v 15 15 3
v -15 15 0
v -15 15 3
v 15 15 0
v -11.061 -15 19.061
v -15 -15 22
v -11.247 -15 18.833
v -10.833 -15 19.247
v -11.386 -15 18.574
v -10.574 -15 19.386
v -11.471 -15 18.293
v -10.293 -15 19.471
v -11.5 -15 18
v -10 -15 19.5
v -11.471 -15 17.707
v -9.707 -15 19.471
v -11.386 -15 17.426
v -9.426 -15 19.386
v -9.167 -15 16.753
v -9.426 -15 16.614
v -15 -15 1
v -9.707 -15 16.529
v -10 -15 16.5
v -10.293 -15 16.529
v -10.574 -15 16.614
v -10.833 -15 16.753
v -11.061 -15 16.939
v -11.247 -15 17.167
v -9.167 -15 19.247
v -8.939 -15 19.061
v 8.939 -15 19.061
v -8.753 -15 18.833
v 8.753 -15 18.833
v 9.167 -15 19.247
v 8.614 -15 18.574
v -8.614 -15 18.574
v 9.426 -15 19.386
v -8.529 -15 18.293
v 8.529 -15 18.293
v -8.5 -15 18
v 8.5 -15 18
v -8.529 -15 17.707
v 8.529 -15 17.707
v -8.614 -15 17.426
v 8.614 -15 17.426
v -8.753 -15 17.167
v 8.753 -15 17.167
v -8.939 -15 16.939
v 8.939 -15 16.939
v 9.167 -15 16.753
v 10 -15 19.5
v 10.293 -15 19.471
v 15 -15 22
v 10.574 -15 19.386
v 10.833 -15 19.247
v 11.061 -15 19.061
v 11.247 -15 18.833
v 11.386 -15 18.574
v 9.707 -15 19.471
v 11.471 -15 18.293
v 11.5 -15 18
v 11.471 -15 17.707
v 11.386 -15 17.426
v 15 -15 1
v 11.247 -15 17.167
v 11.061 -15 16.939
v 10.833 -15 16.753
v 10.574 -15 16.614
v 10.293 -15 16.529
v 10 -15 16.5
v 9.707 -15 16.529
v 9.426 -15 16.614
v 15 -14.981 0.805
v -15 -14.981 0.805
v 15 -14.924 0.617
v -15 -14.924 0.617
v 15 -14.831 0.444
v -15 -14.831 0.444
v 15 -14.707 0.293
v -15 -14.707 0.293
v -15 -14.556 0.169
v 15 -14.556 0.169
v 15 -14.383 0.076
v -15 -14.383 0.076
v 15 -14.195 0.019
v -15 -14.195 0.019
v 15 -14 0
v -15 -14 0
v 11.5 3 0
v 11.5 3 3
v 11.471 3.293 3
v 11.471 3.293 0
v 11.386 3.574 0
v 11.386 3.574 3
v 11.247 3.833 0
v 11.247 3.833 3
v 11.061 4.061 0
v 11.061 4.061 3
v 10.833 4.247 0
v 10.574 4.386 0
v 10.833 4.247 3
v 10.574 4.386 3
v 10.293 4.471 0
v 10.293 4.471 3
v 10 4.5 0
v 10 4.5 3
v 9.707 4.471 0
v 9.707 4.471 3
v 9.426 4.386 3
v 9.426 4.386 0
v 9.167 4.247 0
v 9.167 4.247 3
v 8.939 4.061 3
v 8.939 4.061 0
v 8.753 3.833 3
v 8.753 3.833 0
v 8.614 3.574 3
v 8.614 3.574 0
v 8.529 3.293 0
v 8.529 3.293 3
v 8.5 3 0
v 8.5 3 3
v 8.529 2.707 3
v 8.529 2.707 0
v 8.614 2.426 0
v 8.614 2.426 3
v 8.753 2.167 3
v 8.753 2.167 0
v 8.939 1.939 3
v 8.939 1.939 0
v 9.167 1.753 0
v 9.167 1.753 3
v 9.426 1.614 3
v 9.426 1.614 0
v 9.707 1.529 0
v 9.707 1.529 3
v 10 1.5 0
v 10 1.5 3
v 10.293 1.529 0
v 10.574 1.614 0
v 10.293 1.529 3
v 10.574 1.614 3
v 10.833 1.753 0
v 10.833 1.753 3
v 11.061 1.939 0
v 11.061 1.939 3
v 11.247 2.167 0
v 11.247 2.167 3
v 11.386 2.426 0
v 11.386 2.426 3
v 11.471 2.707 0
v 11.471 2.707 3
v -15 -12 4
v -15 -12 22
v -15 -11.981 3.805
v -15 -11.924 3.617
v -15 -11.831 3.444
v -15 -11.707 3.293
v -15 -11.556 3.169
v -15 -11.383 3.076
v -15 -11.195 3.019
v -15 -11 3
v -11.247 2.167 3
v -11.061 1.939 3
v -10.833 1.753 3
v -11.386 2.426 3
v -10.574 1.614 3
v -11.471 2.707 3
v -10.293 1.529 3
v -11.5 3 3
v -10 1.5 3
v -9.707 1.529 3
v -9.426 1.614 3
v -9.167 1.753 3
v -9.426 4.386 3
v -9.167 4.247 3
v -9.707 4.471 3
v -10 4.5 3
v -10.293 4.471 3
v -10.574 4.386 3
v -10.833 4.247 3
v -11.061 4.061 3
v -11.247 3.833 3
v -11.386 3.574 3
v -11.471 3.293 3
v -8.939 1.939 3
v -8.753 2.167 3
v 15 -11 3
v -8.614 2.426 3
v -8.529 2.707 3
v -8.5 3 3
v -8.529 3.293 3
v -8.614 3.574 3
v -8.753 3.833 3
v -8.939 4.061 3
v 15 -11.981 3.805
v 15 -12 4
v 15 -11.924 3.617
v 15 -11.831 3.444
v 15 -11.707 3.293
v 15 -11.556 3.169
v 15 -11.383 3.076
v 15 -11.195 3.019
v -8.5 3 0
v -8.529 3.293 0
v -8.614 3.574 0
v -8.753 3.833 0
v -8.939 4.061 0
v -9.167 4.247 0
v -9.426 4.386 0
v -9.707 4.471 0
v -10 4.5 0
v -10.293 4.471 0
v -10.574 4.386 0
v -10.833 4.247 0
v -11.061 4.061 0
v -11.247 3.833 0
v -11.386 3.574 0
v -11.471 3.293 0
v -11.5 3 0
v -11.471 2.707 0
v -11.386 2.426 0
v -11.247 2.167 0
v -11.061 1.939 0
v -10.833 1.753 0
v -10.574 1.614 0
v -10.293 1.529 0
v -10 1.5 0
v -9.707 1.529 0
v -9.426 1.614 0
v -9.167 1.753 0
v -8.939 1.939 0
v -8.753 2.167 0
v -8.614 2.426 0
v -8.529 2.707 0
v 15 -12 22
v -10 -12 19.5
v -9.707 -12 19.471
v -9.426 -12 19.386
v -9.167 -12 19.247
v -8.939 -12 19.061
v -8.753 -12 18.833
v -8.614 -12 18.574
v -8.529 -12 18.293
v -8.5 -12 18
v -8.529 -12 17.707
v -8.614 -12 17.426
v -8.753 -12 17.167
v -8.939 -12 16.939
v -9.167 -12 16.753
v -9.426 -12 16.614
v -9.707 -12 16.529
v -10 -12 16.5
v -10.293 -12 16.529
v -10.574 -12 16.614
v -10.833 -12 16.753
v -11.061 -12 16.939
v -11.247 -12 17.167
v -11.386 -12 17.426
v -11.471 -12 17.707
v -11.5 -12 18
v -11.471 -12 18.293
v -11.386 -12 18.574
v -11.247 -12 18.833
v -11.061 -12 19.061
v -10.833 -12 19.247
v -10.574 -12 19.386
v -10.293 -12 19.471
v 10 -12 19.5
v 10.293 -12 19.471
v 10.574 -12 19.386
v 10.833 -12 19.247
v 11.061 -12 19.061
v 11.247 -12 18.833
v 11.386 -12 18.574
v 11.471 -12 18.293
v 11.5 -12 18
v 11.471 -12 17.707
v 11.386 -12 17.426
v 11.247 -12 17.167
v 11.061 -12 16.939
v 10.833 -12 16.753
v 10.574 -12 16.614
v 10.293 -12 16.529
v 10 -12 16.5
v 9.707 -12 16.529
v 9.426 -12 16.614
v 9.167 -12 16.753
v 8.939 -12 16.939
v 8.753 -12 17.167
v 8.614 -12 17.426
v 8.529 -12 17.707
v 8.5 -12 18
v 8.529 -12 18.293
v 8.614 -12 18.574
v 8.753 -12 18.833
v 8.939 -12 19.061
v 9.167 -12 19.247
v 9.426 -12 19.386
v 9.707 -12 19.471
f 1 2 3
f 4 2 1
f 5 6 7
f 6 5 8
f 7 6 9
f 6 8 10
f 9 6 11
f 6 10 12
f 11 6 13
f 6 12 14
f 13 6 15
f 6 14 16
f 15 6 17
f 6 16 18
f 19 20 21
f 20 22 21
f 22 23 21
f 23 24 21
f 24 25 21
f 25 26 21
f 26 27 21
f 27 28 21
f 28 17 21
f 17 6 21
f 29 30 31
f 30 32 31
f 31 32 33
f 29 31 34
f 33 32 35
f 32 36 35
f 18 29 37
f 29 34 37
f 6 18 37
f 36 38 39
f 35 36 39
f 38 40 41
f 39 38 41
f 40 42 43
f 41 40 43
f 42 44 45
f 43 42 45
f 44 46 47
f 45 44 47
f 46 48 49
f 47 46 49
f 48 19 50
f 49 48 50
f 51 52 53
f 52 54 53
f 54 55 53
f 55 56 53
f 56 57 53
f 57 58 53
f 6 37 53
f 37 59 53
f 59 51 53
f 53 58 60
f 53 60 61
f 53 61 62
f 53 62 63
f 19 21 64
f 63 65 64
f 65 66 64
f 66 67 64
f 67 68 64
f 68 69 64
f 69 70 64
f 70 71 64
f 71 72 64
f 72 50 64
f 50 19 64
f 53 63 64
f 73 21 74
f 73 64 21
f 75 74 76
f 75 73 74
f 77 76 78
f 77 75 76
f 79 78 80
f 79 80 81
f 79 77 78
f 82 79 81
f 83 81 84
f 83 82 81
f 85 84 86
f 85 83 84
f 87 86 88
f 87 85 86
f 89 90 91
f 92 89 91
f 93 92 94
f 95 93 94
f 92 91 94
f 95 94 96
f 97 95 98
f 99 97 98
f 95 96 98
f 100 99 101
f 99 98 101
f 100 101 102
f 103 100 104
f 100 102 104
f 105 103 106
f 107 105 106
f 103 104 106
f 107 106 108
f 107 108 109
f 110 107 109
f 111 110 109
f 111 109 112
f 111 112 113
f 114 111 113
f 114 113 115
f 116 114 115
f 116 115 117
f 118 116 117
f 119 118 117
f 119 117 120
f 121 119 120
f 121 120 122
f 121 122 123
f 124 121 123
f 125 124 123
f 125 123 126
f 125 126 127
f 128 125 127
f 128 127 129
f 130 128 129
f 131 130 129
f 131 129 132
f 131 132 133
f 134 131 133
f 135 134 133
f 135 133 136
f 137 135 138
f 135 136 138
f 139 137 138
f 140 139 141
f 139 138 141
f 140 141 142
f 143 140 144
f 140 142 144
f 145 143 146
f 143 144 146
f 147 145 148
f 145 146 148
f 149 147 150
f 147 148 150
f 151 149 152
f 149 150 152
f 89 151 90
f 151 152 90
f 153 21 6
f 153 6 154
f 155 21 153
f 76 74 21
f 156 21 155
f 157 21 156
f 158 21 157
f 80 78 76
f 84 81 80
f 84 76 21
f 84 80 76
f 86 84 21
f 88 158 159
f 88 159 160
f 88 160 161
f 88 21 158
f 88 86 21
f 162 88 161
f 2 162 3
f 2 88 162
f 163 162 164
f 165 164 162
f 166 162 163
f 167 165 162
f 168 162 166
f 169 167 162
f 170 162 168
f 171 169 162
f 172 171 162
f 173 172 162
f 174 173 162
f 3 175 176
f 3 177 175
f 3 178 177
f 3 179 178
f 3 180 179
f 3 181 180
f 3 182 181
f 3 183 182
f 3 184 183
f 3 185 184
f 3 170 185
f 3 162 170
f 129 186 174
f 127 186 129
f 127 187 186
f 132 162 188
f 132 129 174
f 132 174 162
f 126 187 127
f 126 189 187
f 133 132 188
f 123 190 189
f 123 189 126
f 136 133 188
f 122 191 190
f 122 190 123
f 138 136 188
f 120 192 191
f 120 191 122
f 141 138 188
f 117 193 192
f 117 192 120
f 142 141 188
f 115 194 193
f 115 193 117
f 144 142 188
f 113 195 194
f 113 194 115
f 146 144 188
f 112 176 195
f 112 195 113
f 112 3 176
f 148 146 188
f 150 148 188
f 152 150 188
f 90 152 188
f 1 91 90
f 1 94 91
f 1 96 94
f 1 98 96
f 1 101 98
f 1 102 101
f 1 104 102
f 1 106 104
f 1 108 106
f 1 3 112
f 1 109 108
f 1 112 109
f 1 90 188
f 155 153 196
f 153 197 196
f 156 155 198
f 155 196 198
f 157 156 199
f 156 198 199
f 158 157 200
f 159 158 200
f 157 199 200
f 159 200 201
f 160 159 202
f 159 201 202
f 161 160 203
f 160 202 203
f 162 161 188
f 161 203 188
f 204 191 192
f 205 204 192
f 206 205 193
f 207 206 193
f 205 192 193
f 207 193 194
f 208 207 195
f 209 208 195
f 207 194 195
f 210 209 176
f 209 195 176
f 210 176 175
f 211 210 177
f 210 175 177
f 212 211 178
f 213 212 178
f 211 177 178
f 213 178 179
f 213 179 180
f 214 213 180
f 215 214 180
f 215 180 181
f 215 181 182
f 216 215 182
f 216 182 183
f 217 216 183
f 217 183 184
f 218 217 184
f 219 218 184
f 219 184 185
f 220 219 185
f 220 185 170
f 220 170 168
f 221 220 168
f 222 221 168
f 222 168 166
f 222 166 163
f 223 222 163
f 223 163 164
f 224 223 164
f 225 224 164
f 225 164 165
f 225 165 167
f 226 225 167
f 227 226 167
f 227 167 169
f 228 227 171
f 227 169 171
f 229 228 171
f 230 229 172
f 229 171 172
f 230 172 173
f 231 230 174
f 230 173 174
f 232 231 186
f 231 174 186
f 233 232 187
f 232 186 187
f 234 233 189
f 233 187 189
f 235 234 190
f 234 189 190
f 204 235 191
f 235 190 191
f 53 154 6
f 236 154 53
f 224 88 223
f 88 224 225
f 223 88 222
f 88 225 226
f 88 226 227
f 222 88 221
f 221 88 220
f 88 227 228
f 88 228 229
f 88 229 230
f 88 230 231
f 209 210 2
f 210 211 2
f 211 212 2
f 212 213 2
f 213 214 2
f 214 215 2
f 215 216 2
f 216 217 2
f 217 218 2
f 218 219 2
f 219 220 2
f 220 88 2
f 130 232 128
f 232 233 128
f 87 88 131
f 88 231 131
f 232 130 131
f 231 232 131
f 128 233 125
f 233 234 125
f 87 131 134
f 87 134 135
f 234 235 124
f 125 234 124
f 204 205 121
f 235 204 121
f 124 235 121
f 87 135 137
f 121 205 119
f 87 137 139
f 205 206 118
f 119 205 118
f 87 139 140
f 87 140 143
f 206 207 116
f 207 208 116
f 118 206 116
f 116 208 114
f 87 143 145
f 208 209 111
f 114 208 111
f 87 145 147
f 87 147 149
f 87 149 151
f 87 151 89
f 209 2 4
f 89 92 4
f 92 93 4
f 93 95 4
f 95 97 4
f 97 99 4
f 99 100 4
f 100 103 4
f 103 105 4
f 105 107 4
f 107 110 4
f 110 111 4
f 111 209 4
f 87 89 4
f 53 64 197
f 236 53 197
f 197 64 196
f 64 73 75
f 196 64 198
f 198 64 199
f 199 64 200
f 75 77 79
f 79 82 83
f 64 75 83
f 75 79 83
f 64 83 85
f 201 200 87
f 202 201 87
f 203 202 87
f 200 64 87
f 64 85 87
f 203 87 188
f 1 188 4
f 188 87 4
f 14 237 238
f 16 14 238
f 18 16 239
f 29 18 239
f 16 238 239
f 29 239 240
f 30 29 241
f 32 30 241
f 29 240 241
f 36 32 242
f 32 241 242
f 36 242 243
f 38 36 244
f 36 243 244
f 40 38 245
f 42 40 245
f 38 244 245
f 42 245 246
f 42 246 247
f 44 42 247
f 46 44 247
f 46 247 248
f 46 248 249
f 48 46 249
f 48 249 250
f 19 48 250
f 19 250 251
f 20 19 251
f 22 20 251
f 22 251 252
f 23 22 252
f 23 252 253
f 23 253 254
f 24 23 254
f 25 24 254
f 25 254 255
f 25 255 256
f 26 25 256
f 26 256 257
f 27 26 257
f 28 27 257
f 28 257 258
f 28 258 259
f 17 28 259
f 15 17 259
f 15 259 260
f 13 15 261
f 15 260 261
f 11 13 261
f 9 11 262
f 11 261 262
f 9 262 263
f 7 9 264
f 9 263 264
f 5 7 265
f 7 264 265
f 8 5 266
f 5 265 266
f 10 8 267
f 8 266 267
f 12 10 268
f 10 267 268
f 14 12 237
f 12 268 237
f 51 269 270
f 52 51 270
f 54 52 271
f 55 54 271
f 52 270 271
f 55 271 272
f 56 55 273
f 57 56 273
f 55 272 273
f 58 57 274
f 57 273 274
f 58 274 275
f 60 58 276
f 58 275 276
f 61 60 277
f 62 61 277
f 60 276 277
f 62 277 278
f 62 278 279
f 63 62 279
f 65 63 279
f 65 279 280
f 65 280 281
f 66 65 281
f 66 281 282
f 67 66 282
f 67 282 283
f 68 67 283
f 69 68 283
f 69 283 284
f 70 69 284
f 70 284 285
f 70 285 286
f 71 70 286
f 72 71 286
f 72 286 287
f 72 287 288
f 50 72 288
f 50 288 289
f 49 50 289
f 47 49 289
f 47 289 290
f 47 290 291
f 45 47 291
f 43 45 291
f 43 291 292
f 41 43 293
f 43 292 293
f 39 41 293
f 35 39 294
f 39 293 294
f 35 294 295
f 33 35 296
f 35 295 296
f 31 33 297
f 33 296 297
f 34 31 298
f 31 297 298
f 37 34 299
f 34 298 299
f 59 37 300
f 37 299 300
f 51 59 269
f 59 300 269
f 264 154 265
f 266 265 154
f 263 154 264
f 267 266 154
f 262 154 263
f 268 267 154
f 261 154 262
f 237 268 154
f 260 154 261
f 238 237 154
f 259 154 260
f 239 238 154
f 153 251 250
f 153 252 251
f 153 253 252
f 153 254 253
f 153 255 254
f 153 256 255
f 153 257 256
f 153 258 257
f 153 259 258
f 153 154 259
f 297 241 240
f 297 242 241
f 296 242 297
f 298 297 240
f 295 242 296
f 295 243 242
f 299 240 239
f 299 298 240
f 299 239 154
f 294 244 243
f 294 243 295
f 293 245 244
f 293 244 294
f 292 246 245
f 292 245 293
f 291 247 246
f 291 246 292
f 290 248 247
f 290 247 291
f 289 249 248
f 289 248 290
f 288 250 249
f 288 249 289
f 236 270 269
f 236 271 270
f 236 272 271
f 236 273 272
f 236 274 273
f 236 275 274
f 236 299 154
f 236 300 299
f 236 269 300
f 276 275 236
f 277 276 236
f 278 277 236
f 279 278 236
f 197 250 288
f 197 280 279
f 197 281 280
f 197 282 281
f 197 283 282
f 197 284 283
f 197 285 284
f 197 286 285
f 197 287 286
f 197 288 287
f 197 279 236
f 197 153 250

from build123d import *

# Parameters (mm, degrees)
SKETCH_1_W          = 30
SKETCH_1_H          = 30
EXTRUDE_1_DEPTH     = 3
SKETCH_2_R          = 1.5
CUT_EXTRUDE_1_DEPTH = 3.5
SKETCH_3_W          = 30
SKETCH_3_H          = 3
EXTRUDE_2_DEPTH     = 27
SKETCH_4_R          = 1.5
CUT_EXTRUDE_2_DEPTH = 27
FILLET_1_R          = 1
FILLET_2_R          = 1
SKETCH_5_W          = 30
SKETCH_5_H          = 8
CUT_EXTRUDE_3_DEPTH = 10


with BuildPart() as part:
    # 草图1 → 凸台-拉伸1 (new body)
    with BuildSketch(Plane.XY):
        Rectangle(SKETCH_1_W, SKETCH_1_H)
    extrude(amount=EXTRUDE_1_DEPTH)

    # 草图2 → 切除-拉伸1 (cut)
    with BuildSketch(Plane.XY.offset(3)):
        with Locations((10, 3)):
            Circle(SKETCH_2_R)
        with Locations((-10, 3)):
            Circle(SKETCH_2_R)
    extrude(amount=-CUT_EXTRUDE_1_DEPTH, mode=Mode.SUBTRACT)

    # 草图3 → 凸台-拉伸2 (add)
    with BuildSketch(Plane.XY.offset(3)):
        with Locations((0, -13.5)):
            Rectangle(SKETCH_3_W, SKETCH_3_H)
    extrude(amount=EXTRUDE_2_DEPTH)

    # 草图4 → 切除-拉伸2 (cut)
    with BuildSketch(Plane(origin=(0, -12, 0), x_dir=(1, 0, 0), z_dir=(0, 1, 0))):
        with Locations(Location((10, -18, 0), (0, 0, 270))):
            Circle(SKETCH_4_R)
        with Locations(Location((-10, -18, 0), (0, 0, 270))):
            Circle(SKETCH_4_R)
    extrude(amount=-CUT_EXTRUDE_2_DEPTH, mode=Mode.SUBTRACT)

    # 圆角1
    fillet_1_edges = [part.edges().sort_by_distance(p)[0] for p in [
        (0, -12, 3),
    ]]
    fillet(fillet_1_edges, radius=FILLET_1_R)

    # 圆角2
    fillet_2_edges = [part.edges().sort_by_distance(p)[0] for p in [
        (0, -15, 0),
    ]]
    fillet(fillet_2_edges, radius=FILLET_2_R)

    # 草图5 → 切除-拉伸3 (cut)
    with BuildSketch(Plane(origin=(0, -12, 0), x_dir=(1, 0, 0), z_dir=(0, 1, 0))):
        with Locations((0, -26)):
            Rectangle(SKETCH_5_W, SKETCH_5_H)
    extrude(amount=-CUT_EXTRUDE_3_DEPTH, mode=Mode.SUBTRACT)


solid = part.part
